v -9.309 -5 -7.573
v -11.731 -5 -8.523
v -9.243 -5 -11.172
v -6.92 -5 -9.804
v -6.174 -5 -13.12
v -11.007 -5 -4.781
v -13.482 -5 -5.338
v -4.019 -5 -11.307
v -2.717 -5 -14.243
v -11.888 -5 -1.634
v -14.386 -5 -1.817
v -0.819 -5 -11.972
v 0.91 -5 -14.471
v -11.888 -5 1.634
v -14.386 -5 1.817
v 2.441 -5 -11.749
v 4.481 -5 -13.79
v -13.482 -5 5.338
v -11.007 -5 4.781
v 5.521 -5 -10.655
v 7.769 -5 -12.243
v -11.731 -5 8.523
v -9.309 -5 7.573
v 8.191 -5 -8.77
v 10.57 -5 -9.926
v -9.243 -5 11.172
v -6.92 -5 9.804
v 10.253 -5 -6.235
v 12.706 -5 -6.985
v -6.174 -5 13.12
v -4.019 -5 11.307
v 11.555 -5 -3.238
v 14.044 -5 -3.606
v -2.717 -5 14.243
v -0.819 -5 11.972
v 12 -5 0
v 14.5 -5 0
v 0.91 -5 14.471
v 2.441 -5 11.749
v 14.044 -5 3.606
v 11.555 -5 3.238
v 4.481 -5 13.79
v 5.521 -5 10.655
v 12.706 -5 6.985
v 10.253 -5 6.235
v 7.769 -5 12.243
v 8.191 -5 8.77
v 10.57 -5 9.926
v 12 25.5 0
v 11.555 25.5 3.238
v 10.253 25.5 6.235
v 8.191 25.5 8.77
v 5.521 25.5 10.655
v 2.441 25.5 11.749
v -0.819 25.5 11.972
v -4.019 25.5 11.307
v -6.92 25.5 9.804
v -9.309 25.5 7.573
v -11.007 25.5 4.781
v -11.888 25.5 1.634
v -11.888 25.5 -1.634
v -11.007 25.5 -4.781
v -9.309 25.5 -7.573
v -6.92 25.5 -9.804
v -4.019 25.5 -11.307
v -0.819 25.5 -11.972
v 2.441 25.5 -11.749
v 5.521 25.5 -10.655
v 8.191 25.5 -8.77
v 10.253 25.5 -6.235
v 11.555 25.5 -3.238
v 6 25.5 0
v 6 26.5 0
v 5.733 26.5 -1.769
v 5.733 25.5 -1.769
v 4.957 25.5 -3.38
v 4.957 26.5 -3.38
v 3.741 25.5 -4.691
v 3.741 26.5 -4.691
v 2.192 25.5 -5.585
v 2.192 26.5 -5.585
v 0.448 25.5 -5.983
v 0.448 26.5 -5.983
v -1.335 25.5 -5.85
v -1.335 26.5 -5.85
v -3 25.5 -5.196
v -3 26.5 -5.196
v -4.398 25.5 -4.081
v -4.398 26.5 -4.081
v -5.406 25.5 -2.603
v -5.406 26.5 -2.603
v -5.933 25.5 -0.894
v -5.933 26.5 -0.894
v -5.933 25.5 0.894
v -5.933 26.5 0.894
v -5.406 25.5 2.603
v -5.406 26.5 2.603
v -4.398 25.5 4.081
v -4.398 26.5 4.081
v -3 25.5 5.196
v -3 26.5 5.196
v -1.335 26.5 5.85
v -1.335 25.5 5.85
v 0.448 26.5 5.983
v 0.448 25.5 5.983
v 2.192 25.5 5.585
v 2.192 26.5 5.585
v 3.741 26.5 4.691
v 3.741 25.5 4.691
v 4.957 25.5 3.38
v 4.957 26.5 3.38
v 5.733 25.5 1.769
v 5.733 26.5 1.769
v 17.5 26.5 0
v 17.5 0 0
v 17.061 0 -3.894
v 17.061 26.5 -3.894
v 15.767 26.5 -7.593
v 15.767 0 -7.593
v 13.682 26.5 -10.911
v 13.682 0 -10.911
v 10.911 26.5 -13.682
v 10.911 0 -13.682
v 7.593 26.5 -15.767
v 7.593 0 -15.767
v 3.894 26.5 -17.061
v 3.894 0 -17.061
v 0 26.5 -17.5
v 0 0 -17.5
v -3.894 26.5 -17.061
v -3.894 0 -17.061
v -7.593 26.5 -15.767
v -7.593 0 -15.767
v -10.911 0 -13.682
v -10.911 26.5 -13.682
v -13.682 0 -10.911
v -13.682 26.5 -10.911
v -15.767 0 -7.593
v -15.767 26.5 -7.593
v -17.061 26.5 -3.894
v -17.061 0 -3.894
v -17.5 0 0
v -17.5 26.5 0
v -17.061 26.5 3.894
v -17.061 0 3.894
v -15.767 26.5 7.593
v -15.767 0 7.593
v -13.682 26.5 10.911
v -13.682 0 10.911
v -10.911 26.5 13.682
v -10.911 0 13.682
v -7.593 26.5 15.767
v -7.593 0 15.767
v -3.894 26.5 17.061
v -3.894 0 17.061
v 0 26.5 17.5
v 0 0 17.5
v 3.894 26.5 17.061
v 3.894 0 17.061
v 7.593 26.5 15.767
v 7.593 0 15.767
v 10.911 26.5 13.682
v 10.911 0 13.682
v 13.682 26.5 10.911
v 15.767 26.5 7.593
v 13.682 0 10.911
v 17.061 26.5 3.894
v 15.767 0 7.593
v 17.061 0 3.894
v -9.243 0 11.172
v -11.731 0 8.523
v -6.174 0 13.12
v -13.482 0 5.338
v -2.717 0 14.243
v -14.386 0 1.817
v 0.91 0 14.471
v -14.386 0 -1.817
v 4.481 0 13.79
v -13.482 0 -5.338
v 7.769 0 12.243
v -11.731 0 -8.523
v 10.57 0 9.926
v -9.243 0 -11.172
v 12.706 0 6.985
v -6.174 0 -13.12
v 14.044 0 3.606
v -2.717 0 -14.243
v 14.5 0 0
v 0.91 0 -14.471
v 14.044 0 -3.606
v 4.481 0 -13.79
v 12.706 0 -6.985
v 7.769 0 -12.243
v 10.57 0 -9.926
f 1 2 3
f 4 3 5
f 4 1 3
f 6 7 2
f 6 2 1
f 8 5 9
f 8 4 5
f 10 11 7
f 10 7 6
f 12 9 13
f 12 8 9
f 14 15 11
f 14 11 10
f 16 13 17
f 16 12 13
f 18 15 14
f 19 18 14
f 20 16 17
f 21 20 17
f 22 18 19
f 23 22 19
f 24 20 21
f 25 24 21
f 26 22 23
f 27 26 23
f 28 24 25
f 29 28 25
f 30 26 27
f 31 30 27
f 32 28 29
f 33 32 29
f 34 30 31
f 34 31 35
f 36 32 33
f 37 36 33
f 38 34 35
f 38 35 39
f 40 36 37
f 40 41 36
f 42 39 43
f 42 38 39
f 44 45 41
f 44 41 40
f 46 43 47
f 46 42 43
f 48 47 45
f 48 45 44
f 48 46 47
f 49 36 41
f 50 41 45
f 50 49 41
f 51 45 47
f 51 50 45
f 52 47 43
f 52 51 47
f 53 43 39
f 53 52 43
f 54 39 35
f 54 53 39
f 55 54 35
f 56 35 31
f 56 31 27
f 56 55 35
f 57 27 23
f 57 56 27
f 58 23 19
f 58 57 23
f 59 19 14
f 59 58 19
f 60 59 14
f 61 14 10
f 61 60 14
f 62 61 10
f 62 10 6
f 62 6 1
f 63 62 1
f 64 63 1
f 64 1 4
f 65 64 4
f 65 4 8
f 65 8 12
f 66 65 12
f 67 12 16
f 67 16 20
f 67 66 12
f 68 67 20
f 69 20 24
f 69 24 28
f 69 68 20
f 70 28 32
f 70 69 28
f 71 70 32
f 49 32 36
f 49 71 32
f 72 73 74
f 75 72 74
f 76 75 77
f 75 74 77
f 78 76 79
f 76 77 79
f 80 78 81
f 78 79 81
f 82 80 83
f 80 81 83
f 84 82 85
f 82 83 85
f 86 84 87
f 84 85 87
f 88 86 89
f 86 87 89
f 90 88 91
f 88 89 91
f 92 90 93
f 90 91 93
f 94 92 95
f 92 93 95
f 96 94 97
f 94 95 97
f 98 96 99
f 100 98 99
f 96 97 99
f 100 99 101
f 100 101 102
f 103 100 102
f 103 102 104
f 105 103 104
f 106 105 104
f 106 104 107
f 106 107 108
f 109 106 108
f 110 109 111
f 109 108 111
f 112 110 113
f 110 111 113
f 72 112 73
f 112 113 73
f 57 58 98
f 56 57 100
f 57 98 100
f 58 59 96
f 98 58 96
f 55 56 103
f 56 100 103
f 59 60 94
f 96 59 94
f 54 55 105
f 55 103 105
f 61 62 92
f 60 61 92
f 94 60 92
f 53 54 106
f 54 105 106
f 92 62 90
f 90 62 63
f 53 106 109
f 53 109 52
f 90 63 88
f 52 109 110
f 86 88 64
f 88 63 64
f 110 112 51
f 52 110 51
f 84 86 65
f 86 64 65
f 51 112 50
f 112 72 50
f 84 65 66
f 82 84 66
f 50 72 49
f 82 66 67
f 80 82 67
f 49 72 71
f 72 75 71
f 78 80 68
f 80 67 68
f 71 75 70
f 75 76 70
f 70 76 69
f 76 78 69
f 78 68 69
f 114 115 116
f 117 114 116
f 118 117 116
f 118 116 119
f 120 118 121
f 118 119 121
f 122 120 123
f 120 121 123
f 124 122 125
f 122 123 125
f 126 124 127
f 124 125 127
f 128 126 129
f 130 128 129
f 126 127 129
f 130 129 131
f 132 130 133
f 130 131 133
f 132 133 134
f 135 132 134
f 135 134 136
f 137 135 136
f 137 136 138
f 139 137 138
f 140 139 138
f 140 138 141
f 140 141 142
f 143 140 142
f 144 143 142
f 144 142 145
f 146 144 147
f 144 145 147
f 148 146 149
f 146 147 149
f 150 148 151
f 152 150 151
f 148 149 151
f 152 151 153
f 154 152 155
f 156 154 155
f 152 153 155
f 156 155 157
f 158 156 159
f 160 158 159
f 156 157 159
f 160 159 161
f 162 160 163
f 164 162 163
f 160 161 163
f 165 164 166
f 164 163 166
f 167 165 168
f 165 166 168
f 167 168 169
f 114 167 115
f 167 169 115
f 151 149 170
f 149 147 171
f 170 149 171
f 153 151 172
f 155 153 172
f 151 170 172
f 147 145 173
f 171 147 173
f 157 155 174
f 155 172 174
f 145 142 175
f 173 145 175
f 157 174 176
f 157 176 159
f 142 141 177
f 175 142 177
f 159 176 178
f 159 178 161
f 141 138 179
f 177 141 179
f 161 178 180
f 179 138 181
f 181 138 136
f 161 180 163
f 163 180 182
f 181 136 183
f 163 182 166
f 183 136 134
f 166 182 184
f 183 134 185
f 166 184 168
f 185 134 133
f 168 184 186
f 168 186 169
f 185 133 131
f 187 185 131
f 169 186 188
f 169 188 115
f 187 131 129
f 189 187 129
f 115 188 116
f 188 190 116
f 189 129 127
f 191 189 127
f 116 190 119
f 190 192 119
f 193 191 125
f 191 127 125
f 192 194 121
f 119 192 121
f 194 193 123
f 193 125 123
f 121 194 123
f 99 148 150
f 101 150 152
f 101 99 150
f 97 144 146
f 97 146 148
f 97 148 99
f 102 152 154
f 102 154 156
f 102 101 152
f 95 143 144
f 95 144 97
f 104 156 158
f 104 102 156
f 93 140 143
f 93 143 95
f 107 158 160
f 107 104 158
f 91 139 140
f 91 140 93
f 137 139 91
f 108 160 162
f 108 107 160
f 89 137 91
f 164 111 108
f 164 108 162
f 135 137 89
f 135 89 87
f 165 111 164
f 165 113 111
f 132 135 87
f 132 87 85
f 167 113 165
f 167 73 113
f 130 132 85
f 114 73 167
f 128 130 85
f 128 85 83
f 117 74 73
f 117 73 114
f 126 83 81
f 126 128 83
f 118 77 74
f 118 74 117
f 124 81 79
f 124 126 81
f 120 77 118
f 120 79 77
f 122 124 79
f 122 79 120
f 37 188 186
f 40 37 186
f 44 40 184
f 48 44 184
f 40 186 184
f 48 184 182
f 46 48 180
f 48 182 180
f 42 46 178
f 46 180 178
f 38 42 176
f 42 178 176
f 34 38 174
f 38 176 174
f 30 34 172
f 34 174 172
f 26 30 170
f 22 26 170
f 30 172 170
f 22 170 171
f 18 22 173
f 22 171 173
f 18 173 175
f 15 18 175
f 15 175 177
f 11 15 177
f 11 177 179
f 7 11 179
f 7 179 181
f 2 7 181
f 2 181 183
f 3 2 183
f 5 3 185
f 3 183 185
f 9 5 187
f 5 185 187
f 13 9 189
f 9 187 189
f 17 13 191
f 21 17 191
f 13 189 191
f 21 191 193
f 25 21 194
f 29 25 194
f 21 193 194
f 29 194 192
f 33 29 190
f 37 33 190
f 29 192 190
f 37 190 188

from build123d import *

# Parameters (mm, degrees)
SKETCH1_R           = 17.5
SKETCH1_R_2         = 12
BOSS_EXTRUDE1_DEPTH = 26.5
SKETCH2_R           = 12
SKETCH2_R_2         = 6
BOSS_EXTRUDE2_DEPTH = 1
SKETCH3_R           = 14.5
SKETCH3_R_2         = 12
BOSS_EXTRUDE3_DEPTH = 5


with BuildPart() as part:
    # Sketch1 → Boss-Extrude1 (new body)
    with BuildSketch(Plane(origin=(0, 0, 0), x_dir=(1, 0, 0), z_dir=(0, 1, 0))):
        Circle(SKETCH1_R)
        Circle(SKETCH1_R_2, mode=Mode.SUBTRACT)
    extrude(amount=BOSS_EXTRUDE1_DEPTH)

    # Sketch2 → Boss-Extrude2 (add)
    with BuildSketch(Plane(origin=(0, 26.5, 0), x_dir=(1, 0, 0), z_dir=(0, 1, 0))):
        Circle(SKETCH2_R)
        Circle(SKETCH2_R_2, mode=Mode.SUBTRACT)
    extrude(amount=-BOSS_EXTRUDE2_DEPTH)

    # Sketch3 → Boss-Extrude3 (add)
    with BuildSketch(Plane.XZ):
        Circle(SKETCH3_R)
        Circle(SKETCH3_R_2, mode=Mode.SUBTRACT)
    extrude(amount=BOSS_EXTRUDE3_DEPTH)


solid = part.part
